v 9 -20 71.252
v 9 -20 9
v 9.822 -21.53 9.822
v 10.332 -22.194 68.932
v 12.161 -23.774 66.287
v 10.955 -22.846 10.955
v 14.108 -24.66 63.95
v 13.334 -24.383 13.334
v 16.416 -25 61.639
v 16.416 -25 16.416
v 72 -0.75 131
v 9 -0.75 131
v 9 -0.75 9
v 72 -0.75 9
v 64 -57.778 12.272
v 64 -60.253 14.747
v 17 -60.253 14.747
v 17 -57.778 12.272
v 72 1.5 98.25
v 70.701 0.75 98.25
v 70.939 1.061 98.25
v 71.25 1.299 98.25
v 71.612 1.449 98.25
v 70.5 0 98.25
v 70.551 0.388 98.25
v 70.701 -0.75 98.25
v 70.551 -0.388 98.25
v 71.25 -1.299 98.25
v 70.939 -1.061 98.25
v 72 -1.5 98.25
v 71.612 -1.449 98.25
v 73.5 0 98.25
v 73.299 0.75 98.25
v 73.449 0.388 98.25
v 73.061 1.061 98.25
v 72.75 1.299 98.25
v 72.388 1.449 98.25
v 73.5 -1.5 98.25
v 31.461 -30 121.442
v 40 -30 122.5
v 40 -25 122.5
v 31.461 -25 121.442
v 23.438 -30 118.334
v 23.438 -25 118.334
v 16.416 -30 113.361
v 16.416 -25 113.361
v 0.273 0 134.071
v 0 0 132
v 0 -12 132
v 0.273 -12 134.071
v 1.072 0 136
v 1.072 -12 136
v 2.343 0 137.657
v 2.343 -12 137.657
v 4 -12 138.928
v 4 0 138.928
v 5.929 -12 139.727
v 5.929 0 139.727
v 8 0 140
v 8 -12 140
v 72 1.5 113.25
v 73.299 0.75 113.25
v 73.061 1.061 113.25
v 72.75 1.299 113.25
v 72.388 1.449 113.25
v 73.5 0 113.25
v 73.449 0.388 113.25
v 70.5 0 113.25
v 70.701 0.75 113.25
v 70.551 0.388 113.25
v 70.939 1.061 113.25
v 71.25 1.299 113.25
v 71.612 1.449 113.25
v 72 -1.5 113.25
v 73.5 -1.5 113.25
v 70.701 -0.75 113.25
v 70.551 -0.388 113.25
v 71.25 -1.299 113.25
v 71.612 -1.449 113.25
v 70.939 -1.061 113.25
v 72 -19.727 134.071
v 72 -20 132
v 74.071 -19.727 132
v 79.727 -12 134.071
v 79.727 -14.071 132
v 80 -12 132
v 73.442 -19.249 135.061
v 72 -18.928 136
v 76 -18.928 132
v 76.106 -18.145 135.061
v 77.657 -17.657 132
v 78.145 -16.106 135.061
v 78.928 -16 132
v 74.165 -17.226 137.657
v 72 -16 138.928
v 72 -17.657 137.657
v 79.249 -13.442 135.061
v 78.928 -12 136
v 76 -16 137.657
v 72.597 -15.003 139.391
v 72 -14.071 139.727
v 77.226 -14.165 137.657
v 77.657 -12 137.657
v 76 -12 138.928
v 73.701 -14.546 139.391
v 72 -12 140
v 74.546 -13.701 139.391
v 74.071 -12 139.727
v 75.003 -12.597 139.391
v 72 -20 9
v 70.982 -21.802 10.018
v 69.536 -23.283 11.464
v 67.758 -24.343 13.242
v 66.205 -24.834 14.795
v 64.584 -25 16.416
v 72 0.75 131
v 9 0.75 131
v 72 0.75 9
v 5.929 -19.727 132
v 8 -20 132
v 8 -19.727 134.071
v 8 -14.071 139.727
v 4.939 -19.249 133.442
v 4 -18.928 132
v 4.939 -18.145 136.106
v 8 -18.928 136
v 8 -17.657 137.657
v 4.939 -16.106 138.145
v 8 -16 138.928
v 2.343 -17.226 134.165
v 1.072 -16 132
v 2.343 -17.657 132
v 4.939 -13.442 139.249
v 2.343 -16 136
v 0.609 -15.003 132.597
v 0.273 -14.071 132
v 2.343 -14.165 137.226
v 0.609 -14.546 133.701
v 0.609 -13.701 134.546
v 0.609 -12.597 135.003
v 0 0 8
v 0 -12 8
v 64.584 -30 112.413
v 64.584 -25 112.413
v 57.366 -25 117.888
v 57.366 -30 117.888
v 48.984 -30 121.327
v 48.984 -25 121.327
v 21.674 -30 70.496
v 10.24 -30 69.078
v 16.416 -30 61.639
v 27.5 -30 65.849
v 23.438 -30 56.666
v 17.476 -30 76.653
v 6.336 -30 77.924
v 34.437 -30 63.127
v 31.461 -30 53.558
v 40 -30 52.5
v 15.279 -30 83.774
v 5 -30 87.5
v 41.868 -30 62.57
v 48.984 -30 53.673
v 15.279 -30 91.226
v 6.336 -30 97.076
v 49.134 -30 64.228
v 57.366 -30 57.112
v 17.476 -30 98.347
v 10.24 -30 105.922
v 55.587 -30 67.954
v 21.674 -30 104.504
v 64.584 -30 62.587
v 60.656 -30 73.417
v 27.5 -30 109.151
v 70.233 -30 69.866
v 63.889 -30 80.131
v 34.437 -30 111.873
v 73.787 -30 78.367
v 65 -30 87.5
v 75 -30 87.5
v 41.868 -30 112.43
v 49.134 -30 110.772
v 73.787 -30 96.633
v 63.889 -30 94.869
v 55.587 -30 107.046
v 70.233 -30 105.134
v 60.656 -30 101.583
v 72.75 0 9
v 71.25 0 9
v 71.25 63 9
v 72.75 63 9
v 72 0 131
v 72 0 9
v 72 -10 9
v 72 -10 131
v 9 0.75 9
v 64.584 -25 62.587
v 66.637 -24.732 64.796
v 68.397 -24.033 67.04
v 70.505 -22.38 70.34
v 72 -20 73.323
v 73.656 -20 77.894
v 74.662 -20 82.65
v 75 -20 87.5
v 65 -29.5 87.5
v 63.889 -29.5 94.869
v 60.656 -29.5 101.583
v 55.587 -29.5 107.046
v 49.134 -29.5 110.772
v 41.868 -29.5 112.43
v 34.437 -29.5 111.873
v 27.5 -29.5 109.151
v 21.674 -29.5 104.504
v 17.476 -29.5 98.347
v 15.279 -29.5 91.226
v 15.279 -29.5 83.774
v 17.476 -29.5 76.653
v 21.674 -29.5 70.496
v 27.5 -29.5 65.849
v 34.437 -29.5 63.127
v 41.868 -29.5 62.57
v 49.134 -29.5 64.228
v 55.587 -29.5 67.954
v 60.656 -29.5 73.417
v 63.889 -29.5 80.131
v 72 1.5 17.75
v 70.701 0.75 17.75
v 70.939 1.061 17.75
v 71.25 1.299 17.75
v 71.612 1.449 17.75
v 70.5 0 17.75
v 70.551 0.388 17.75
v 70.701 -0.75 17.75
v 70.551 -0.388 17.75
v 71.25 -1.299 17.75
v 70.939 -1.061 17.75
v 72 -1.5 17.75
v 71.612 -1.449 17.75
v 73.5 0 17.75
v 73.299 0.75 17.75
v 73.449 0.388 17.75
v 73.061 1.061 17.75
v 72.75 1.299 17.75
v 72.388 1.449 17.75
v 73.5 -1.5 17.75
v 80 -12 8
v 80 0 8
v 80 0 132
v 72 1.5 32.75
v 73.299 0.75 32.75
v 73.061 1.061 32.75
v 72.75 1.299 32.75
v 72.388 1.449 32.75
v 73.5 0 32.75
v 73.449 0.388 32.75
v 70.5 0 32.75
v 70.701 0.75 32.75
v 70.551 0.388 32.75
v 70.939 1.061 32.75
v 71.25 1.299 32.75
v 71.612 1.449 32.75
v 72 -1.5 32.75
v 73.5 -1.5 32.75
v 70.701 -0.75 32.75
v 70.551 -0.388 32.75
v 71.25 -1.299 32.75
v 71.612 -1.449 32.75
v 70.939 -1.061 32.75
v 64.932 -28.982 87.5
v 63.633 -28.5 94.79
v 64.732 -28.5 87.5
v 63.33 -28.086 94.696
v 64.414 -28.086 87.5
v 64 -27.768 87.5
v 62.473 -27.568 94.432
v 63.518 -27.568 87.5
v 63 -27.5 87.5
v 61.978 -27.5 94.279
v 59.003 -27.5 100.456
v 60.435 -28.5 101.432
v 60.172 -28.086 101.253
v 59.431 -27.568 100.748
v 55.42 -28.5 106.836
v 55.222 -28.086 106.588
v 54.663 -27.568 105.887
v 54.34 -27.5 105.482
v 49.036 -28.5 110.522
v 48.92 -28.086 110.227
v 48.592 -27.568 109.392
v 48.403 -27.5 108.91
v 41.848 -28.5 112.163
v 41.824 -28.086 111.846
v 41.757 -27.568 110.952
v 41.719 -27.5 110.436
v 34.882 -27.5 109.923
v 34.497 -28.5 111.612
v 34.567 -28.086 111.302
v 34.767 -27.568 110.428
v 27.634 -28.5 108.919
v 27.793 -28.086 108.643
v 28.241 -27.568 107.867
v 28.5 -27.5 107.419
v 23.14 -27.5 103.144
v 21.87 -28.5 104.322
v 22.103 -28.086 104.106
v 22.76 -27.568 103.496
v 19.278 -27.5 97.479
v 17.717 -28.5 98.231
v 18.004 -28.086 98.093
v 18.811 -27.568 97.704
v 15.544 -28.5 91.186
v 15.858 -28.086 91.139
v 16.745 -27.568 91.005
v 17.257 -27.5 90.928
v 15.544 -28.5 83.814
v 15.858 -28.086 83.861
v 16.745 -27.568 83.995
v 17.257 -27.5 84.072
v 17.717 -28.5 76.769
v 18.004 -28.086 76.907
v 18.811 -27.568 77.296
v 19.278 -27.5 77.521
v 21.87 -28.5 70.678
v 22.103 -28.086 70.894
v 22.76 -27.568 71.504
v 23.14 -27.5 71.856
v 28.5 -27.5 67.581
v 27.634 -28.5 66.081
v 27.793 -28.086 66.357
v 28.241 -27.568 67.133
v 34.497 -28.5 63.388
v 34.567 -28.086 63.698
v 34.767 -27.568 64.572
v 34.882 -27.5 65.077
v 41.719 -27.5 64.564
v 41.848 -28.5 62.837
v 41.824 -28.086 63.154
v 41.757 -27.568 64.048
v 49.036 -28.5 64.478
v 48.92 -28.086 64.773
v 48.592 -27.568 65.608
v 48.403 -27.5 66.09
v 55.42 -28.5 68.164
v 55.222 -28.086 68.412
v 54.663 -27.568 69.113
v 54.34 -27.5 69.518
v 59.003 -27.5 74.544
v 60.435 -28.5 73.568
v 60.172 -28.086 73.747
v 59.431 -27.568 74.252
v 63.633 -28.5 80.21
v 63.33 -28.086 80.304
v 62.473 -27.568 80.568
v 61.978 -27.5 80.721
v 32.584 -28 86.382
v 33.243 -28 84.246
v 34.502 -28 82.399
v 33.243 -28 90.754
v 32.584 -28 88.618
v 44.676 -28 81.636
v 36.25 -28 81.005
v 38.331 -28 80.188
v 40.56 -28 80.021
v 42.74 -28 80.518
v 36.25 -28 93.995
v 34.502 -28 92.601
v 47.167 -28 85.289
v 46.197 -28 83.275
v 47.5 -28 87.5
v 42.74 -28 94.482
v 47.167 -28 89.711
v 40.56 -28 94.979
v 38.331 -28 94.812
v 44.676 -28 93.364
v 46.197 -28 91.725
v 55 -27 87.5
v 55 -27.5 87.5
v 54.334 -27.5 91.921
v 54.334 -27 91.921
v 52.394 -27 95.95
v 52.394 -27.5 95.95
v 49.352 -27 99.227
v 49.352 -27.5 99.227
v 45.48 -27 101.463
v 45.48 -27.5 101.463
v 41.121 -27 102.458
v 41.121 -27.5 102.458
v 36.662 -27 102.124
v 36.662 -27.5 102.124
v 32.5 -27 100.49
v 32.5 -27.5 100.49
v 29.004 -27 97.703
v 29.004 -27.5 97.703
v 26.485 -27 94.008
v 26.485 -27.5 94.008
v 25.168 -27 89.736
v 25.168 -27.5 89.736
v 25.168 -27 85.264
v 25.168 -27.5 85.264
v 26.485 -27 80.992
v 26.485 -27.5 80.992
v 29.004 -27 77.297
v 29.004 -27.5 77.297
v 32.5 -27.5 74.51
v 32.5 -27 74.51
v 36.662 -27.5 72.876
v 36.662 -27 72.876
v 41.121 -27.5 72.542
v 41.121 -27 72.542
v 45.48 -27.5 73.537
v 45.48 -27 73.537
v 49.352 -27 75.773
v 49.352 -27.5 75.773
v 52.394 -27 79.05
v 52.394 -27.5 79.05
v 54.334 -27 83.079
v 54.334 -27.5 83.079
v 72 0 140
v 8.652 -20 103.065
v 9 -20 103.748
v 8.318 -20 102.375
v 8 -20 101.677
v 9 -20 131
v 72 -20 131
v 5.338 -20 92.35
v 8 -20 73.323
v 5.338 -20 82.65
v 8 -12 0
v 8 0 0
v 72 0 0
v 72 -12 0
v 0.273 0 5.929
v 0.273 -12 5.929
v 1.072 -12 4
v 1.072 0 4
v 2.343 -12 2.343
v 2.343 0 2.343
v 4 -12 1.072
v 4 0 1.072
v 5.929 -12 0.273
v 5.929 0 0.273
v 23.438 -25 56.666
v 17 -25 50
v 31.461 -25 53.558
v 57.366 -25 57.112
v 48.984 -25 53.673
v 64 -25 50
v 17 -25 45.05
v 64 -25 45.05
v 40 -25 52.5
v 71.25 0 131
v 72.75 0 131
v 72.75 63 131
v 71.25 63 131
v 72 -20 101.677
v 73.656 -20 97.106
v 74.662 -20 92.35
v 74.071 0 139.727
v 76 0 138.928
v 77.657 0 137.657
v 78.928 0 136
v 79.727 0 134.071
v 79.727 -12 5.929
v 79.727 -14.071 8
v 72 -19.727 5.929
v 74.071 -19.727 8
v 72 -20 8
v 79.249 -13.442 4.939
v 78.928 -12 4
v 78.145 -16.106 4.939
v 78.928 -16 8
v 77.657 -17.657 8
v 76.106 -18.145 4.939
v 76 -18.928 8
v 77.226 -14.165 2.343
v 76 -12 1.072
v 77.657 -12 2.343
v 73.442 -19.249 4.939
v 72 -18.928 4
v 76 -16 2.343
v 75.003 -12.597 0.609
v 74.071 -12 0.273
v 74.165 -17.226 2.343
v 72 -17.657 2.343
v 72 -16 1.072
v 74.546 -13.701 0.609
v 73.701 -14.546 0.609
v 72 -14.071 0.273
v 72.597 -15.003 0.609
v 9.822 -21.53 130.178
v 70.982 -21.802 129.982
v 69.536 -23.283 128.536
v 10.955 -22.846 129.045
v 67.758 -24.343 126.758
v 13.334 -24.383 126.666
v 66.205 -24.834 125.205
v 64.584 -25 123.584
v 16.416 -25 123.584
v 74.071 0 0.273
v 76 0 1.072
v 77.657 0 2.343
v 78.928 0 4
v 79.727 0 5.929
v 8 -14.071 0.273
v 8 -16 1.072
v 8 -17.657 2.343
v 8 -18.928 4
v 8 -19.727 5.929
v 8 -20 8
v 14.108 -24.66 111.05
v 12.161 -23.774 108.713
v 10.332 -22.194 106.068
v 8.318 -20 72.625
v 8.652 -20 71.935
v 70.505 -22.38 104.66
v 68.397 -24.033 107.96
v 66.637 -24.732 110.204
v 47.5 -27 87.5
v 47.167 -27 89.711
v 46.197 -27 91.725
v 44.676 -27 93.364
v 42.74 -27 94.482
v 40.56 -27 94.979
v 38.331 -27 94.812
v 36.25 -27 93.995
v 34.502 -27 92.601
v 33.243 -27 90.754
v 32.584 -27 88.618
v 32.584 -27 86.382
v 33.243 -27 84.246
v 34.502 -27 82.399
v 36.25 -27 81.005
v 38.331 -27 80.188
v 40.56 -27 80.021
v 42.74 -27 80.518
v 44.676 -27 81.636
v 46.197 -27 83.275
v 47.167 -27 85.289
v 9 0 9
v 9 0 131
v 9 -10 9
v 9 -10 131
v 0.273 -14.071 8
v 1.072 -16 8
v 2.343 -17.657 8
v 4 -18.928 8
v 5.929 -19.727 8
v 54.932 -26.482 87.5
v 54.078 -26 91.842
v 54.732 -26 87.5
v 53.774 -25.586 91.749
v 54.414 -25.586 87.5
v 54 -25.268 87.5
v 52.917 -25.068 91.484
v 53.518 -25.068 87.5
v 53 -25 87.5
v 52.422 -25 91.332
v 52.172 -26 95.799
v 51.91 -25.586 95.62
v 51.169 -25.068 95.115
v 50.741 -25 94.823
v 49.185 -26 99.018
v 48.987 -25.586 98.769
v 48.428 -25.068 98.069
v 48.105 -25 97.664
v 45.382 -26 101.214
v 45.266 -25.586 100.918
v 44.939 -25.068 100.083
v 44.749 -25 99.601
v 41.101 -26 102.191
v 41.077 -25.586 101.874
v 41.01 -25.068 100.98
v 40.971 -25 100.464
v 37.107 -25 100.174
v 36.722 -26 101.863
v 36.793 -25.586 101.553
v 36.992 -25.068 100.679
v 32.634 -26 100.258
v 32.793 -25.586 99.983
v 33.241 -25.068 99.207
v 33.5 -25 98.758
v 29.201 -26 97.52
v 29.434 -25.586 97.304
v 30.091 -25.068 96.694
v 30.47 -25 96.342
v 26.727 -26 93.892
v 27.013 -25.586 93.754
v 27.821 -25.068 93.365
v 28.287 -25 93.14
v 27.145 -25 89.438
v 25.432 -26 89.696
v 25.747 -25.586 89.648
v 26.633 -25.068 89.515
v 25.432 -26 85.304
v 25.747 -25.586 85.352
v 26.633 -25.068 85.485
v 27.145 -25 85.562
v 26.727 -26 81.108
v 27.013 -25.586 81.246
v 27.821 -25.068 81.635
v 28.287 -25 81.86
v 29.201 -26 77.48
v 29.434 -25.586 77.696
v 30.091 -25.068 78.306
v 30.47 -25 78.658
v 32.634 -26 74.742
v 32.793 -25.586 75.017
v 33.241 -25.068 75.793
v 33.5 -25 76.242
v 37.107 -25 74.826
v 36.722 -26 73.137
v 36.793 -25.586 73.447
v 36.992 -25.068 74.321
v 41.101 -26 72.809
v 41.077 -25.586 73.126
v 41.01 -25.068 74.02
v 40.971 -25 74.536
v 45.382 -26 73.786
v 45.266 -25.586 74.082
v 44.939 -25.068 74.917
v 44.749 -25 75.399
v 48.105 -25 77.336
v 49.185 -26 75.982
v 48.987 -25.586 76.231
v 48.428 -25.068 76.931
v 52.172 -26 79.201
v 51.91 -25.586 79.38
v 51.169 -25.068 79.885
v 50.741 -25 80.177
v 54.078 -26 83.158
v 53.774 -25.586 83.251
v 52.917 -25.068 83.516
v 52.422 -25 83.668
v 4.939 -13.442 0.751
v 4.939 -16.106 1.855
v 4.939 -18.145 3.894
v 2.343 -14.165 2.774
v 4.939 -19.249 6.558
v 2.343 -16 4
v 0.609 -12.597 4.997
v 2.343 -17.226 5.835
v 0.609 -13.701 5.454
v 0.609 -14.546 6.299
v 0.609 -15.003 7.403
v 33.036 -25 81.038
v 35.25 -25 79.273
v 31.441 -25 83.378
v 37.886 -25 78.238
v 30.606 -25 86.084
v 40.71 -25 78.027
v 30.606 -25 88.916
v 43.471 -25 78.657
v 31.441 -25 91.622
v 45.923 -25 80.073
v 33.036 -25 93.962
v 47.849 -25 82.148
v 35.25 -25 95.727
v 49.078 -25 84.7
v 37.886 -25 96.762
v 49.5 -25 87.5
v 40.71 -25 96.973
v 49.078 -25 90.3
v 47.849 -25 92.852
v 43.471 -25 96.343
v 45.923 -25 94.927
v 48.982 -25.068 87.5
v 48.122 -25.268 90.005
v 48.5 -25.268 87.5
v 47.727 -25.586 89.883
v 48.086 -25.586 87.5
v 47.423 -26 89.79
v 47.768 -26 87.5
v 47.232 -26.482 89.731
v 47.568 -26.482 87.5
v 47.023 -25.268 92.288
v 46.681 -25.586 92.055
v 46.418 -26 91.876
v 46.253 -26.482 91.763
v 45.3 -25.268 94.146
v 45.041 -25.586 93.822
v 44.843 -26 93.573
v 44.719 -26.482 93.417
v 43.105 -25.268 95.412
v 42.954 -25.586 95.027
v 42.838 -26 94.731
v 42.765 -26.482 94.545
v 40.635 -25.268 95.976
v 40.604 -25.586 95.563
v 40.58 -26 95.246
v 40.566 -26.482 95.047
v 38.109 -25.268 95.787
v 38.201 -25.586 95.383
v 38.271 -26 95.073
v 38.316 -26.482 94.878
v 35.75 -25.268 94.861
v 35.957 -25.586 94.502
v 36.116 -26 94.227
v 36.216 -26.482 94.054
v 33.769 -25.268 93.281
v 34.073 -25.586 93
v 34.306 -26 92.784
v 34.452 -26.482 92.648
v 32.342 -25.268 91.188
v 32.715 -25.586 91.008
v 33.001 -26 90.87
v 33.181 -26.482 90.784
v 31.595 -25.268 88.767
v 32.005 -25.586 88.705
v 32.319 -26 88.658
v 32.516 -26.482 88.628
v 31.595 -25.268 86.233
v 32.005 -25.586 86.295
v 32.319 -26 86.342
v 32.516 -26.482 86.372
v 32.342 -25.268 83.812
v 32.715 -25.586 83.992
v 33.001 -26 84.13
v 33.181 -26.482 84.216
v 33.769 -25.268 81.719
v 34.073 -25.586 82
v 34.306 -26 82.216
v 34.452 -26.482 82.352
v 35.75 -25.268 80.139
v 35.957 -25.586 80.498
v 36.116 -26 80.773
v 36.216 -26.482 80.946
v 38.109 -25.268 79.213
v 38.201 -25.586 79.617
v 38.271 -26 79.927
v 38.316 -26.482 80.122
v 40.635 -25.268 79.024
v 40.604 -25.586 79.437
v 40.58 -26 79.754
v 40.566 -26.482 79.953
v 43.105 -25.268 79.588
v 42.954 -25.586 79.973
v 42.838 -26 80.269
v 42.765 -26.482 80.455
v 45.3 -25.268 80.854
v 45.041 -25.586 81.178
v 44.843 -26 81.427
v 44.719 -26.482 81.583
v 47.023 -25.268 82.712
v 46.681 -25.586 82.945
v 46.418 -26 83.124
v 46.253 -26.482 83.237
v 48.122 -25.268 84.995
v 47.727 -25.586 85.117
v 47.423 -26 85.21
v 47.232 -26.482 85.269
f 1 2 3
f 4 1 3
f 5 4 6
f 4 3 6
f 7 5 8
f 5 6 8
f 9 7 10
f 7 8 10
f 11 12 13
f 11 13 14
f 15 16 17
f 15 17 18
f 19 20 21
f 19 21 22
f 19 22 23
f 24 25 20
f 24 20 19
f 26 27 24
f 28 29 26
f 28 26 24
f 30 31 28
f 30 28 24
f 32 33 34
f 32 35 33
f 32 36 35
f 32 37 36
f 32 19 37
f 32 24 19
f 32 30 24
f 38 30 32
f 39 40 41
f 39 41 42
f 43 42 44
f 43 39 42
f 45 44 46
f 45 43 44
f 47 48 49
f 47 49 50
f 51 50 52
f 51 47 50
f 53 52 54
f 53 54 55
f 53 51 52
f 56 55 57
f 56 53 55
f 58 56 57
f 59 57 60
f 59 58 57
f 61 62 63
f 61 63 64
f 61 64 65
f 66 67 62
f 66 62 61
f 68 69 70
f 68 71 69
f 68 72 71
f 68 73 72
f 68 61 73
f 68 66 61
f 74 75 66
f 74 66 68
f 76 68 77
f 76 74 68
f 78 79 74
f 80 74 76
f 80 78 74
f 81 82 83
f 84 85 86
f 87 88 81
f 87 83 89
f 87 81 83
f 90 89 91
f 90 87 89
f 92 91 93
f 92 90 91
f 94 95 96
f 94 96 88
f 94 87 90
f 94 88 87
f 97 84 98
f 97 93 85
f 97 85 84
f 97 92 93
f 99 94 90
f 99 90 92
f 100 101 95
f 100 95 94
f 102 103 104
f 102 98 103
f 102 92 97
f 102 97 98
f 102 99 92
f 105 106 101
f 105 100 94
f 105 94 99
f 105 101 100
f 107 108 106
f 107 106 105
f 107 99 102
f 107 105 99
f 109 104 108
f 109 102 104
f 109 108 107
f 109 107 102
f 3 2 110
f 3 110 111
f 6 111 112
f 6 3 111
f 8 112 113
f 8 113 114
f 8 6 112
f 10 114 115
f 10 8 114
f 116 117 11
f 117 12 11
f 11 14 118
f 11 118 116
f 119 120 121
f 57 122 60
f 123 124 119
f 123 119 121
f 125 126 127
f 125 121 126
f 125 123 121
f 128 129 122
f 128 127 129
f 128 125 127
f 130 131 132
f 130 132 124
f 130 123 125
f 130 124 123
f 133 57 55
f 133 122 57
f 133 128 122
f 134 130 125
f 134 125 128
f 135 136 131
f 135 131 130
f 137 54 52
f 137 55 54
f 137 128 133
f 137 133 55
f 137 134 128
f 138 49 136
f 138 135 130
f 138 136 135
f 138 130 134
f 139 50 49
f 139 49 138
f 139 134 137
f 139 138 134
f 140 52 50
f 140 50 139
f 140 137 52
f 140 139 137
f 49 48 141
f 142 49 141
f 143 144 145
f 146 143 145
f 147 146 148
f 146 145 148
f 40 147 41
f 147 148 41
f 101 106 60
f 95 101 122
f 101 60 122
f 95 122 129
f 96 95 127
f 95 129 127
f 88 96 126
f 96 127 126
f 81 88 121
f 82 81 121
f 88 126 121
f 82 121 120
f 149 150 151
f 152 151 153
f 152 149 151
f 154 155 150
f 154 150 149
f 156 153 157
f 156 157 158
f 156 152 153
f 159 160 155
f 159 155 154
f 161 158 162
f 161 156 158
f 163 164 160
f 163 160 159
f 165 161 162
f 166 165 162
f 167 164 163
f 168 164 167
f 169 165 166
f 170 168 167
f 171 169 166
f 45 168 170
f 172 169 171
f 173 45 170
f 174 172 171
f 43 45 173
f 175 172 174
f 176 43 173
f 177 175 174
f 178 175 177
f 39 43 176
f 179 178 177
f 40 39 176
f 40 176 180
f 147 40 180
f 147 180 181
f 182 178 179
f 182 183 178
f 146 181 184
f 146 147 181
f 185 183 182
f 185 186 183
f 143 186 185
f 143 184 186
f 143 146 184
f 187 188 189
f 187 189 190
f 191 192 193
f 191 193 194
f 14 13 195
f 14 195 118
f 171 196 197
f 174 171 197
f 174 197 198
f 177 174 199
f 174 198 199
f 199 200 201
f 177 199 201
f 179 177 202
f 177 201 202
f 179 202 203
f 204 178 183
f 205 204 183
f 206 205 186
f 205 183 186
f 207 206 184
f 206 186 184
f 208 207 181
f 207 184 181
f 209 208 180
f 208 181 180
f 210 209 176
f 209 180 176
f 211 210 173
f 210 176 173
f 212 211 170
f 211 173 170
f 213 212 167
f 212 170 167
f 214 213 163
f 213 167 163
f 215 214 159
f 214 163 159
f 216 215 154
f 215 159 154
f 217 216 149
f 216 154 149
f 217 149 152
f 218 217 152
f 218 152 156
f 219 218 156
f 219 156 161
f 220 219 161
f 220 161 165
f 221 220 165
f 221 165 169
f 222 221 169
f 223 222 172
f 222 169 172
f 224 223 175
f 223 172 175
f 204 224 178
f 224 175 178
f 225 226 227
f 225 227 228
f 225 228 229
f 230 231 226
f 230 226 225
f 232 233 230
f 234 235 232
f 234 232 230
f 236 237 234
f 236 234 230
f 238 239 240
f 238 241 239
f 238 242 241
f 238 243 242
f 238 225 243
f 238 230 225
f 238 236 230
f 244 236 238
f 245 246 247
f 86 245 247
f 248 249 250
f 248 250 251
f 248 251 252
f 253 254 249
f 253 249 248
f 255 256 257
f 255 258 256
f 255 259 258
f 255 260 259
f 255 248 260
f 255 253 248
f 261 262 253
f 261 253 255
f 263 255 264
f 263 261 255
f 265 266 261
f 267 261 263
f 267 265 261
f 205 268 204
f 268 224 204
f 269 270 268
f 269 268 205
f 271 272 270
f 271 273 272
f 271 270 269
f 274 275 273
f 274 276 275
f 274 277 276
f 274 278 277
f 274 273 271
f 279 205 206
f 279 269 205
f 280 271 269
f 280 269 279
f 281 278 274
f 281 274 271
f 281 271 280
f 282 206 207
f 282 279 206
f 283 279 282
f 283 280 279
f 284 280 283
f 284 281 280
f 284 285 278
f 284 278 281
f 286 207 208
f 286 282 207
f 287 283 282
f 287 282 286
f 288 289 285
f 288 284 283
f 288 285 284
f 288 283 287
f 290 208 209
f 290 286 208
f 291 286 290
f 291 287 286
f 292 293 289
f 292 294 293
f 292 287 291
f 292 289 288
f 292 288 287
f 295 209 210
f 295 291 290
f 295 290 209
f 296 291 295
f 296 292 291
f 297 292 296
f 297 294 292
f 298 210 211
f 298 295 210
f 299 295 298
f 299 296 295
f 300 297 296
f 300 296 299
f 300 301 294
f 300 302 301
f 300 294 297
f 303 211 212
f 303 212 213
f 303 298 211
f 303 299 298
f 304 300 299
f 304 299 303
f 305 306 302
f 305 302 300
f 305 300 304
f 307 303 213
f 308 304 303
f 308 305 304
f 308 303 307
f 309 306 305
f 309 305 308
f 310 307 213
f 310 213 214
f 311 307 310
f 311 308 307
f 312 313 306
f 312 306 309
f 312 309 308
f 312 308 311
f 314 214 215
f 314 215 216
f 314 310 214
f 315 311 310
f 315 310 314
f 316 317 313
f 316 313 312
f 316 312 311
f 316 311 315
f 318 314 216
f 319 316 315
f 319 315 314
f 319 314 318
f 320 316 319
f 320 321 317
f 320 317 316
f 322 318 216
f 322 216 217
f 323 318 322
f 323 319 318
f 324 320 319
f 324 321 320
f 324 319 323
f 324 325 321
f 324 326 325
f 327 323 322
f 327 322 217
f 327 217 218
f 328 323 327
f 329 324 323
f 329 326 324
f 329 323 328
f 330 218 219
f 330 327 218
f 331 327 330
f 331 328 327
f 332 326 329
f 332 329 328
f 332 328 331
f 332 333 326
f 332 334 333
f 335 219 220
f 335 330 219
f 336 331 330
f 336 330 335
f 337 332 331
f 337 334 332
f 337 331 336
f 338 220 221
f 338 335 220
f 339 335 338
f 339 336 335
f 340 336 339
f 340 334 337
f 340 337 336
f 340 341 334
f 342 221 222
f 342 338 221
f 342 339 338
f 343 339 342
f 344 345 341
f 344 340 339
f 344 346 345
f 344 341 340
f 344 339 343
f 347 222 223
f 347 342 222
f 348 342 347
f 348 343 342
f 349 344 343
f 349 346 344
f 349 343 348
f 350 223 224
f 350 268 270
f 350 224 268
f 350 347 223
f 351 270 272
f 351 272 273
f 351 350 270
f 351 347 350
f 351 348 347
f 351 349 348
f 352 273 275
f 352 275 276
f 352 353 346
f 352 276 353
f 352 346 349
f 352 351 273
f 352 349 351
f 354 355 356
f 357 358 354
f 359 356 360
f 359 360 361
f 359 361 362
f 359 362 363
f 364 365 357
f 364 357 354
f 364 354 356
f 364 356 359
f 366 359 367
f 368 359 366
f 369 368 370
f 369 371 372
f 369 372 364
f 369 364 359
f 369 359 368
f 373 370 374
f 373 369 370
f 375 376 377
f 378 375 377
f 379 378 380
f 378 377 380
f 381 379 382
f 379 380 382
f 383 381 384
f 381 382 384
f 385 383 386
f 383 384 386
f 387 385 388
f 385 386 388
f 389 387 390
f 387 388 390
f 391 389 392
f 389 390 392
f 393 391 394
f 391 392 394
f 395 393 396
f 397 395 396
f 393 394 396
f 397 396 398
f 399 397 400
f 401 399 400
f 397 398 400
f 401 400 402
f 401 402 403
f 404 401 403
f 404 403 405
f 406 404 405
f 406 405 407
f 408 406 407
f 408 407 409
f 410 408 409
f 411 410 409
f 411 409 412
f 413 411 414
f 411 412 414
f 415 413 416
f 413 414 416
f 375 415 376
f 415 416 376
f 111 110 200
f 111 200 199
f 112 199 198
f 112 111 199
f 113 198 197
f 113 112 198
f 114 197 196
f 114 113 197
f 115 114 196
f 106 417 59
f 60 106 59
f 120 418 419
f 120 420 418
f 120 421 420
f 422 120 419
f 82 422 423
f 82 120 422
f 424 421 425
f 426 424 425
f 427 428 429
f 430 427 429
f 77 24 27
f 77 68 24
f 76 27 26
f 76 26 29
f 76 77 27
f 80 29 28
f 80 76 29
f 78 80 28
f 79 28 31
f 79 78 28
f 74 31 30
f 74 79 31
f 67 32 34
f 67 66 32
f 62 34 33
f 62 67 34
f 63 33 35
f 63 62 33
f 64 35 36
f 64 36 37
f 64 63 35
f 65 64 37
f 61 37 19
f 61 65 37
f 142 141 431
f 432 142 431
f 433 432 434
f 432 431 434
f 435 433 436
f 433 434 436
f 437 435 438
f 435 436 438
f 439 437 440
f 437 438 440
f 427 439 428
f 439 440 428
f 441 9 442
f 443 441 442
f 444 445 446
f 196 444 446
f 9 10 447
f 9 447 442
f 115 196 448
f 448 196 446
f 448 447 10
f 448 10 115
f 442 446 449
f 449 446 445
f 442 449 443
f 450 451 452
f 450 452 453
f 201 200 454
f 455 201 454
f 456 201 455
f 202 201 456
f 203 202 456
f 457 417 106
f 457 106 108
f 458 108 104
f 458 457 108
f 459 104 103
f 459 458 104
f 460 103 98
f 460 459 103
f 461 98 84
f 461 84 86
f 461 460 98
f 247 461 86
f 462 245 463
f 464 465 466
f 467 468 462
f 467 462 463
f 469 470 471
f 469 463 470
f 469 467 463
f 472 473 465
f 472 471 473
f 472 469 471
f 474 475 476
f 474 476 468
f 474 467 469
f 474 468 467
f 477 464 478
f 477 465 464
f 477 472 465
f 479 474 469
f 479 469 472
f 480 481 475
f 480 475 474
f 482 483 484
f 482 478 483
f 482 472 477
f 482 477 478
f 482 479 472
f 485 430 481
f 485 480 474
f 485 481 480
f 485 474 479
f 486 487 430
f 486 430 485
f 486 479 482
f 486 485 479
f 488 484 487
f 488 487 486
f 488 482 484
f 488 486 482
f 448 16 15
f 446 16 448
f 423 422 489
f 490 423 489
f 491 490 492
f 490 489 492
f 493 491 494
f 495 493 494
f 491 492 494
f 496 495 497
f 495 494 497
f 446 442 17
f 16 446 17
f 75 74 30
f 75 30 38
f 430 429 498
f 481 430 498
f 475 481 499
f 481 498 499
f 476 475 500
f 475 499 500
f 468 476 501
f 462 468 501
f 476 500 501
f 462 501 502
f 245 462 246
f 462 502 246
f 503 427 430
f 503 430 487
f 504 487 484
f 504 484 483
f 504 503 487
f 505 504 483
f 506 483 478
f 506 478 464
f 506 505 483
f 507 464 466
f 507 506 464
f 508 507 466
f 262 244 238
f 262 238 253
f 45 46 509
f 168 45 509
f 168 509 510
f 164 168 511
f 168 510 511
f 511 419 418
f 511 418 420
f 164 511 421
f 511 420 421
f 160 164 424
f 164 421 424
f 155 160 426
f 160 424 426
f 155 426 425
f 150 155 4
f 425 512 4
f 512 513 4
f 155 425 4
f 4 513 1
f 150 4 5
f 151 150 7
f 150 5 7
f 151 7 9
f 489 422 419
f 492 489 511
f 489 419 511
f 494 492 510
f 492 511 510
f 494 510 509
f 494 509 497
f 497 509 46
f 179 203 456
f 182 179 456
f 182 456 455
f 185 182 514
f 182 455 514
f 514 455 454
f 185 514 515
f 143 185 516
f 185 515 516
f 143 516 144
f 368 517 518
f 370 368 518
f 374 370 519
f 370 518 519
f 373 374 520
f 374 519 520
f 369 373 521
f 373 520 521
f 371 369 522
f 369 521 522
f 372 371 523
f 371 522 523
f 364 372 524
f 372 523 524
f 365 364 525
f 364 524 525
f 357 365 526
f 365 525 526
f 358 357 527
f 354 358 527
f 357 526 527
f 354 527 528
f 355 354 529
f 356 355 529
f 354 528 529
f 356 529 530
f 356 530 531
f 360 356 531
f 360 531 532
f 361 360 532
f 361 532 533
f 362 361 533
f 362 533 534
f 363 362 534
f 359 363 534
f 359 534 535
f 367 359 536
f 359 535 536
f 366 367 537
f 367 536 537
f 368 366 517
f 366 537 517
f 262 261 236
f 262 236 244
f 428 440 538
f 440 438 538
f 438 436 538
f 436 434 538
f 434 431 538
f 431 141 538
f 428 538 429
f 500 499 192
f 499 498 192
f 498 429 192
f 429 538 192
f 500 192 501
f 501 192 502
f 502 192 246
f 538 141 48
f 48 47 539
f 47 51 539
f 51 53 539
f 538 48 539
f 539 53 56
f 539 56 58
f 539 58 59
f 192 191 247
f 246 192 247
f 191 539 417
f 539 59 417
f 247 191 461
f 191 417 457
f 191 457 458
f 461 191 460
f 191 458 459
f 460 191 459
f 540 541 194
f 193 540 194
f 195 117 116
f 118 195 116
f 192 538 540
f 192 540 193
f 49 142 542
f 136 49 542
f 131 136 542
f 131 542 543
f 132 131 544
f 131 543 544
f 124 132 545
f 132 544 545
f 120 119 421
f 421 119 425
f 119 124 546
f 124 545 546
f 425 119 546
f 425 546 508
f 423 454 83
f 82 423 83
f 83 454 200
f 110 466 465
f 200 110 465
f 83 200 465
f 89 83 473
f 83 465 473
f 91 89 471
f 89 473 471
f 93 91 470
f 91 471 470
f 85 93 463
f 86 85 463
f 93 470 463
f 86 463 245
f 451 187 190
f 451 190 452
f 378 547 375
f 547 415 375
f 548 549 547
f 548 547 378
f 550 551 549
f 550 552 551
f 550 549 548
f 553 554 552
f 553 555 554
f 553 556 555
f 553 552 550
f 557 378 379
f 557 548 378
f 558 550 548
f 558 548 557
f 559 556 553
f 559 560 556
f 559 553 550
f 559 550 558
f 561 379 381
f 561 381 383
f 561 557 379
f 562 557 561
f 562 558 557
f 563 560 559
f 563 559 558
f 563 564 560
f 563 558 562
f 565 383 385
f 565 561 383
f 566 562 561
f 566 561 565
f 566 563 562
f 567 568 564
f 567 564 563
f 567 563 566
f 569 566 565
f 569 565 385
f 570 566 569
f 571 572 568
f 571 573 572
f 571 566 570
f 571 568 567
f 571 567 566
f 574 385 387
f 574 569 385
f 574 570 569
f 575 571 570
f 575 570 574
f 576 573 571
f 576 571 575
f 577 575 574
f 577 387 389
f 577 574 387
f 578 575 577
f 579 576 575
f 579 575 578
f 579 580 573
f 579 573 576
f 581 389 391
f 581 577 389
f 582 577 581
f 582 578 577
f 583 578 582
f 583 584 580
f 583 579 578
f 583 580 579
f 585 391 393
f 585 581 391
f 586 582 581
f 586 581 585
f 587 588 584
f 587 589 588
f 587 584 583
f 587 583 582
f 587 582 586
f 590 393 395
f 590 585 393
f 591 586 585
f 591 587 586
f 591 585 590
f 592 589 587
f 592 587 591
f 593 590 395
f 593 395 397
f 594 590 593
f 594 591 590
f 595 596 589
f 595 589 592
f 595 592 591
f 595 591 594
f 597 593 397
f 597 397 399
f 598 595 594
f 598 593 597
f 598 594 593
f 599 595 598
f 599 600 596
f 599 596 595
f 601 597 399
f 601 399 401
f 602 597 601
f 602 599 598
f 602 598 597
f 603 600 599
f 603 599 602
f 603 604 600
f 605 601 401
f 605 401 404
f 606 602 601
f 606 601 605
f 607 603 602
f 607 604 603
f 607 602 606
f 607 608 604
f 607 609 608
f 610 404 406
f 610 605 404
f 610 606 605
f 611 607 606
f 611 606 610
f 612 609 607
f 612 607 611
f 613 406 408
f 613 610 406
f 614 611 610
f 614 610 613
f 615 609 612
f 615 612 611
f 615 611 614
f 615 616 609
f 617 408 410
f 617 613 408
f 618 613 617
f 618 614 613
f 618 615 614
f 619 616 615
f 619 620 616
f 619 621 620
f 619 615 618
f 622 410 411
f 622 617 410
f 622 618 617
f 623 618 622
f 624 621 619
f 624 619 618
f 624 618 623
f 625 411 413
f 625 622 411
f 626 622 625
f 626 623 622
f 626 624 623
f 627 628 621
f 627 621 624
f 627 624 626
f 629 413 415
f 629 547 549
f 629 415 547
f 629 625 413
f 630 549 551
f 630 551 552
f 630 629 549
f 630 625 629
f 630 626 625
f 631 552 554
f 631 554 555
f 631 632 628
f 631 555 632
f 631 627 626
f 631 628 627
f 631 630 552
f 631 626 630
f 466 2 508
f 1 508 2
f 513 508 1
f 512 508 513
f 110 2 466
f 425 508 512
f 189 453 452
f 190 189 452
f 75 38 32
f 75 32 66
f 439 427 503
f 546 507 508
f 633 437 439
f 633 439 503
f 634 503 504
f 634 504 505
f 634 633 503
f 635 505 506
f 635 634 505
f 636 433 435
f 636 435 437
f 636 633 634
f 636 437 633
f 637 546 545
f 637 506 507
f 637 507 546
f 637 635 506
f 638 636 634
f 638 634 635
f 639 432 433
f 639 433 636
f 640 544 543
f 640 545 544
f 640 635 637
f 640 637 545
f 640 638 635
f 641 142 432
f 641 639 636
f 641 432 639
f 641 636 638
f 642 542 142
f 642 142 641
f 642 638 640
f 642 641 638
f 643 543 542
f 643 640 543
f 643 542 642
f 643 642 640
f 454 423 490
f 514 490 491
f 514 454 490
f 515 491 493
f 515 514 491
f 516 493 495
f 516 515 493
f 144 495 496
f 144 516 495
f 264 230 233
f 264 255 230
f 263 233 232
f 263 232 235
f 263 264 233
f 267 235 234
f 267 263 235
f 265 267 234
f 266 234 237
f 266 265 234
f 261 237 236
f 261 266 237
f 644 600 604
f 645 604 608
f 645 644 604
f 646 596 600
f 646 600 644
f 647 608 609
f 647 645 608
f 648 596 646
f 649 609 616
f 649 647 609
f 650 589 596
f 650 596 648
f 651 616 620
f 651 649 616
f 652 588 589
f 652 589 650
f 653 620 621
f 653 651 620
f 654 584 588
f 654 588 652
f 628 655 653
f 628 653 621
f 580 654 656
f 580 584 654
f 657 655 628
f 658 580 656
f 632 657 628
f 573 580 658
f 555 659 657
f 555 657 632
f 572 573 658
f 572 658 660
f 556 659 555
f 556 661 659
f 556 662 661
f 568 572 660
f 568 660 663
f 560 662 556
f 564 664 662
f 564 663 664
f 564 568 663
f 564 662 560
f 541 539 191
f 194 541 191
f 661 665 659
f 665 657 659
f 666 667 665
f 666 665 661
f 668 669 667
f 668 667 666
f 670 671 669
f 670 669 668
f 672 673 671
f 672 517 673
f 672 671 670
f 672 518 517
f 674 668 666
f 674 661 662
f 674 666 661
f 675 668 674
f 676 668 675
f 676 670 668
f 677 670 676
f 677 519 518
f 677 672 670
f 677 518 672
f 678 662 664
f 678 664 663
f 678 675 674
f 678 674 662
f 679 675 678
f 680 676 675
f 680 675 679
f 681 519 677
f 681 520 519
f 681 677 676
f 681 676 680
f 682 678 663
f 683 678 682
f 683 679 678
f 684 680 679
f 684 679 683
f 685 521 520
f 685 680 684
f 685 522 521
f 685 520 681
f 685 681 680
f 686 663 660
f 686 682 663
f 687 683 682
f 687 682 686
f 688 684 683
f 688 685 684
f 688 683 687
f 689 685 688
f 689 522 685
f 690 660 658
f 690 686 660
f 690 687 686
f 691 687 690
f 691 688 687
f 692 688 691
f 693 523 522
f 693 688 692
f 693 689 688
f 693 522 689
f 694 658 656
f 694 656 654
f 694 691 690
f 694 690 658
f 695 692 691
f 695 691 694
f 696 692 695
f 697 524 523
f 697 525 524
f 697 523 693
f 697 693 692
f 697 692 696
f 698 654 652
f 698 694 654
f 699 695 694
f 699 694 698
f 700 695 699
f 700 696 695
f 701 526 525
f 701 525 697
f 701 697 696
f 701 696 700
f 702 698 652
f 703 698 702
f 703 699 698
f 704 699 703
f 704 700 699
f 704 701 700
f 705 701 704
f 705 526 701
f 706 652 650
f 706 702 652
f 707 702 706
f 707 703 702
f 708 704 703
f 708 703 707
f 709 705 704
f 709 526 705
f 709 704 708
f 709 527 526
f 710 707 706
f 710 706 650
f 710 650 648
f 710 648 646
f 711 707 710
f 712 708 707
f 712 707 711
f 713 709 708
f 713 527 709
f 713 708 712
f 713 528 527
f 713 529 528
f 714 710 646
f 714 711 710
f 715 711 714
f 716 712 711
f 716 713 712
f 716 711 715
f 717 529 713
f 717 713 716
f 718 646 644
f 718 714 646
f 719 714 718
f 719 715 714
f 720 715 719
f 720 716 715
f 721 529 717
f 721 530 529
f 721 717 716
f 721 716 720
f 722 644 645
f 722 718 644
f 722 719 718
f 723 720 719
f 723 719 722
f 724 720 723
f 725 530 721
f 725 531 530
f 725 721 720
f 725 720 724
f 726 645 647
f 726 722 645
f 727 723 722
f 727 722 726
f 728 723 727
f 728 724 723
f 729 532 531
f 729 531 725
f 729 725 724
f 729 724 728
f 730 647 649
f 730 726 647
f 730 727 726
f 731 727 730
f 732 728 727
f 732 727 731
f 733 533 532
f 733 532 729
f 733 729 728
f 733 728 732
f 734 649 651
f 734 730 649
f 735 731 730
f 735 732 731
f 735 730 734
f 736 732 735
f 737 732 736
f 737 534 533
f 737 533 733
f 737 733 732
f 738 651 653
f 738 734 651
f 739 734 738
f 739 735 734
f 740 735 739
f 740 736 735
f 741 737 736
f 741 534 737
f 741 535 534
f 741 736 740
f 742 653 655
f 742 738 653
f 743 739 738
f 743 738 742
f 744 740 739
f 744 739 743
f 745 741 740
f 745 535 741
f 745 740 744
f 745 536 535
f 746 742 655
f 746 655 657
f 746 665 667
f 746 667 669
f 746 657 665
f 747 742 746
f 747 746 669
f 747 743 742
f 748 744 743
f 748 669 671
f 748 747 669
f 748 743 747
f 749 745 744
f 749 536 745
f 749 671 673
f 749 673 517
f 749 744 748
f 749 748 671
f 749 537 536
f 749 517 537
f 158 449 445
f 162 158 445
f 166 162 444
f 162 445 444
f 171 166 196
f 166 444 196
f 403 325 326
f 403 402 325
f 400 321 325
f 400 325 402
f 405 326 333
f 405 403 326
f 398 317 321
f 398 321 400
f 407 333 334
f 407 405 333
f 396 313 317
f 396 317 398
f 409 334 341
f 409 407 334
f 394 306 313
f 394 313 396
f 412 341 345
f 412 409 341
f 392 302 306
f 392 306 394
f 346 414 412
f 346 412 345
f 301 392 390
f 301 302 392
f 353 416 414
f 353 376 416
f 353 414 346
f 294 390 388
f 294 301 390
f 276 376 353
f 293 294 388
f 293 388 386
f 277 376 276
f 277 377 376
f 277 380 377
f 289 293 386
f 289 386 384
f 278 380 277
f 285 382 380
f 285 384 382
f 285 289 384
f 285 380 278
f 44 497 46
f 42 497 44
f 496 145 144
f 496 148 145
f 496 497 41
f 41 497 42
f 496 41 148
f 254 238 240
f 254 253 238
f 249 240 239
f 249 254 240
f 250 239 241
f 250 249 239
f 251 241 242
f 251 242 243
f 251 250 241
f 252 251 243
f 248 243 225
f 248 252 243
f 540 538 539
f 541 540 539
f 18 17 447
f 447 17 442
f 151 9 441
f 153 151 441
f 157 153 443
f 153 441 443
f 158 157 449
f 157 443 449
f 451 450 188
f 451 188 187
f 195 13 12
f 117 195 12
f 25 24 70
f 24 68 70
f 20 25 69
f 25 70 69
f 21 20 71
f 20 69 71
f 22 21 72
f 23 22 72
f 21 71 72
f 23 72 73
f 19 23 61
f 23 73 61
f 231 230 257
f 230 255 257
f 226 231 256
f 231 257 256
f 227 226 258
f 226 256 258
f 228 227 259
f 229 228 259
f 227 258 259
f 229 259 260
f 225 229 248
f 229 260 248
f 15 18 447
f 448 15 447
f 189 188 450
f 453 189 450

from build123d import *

# Parameters (mm, degrees)
F0_W         = 63
F0_H         = 122
F1_DEPTH     = 20
F2_DEPTH     = 25
F3_DEPTH     = 10
F4_T1_DEPTH  = 32
F4_T3_DEPTH  = 64
F4_T5_DEPTH  = 124
F4_T7_DEPTH  = 159.0809924355
F4_T9_DEPTH  = 100.0809924355
F4_S13_W     = 8.16
F4_S13_H     = 8.16
F4_T14_DEPTH = 8.16
F4_S19_W     = 8.16
F4_S19_H     = 8.16
F4_T20_DEPTH = 8.16
F4_S25_W     = 8.16
F4_S25_H     = 8.16
F4_T26_DEPTH = 8.16
F4_S31_W     = 8.16
F4_S31_H     = 8.16
F4_T32_DEPTH = 8.16
F5_W         = 1.5
F5_H         = 15
F6_DEPTH     = 1.5
F7_R         = 1.49999
F7_2_R       = 1.49999
F8_W         = 0.75
F8_H         = 122
F9_DEPTH     = 63
F10_W        = 63
F10_H        = 122
F11_DEPTH    = 0.75
F13_DEPTH    = 64
F14_DEPTH    = 17
F16_DEPTH    = 5
F17_R        = 25
F18_DEPTH    = 2.5
F19_R        = 15
F20_DEPTH    = 2.5
F21_R        = 7.5
F22_DEPTH    = 3
F23_R        = 2


# Not quite as in the source:
# - a fillet or chamfer that OpenCascade refuses, or shapes differently, is made with other operations: its cross-section is extruded or revolved along the edge and cut away or added
# - a fillet or chamfer is up to 0.001 mm smaller than in the source, because OpenCascade refuses the exact size


with BuildPart() as f1:
    # F0 (on Front) → F1 (new body)
    with BuildSketch(Plane.XZ):
        Polygon((0, 140), (0, 0), (9, 0), (80, 0), (80, 140), align=None)
        with Locations((40.5, 70)):
            Rectangle(F0_W, F0_H, mode=Mode.SUBTRACT)
    extrude(amount=F1_DEPTH)

    # F0 (on Front) → F2 (join)
    with BuildSketch(Plane.XZ):
        with Locations((40.5, 70)):
            Rectangle(F0_W, F0_H)
    extrude(amount=F2_DEPTH)

    # F0 (on Front) → F3 (cut)
    with BuildSketch(Plane.XZ):
        with Locations((40.5, 70)):
            Rectangle(F0_W, F0_H)
    extrude(amount=F3_DEPTH, mode=Mode.SUBTRACT)

    # F4: fillet of radius 8 on 12 edges, made by hand

    # F4_s2 → F4_t1 (cut)
    with BuildSketch(Plane.XZ.offset(-20)):
        with BuildLine():
            ThreePointArc((0, 8), (2.3431457505, 2.3431457505), (8, 0))
            Line((8, 0), (8, -0.16))
            Line((8, -0.16), (-0.16, -0.16))
            Line((-0.16, -0.16), (-0.16, 8))
            Line((-0.16, 8), (0, 8))
        make_face()
        with BuildLine():
            ThreePointArc((72, 0), (77.6568542495, 2.3431457505), (80, 8))
            Line((80, 8), (80.16, 8))
            Line((80.16, 8), (80.16, -0.16))
            Line((80.16, -0.16), (72, -0.16))
            Line((72, -0.16), (72, 0))
        make_face()
        with BuildLine():
            ThreePointArc((0, 132), (2.3431457505, 137.6568542495), (8, 140))
            Line((8, 140), (8, 140.16))
            Line((8, 140.16), (-0.16, 140.16))
            Line((-0.16, 140.16), (-0.16, 132))
            Line((-0.16, 132), (0, 132))
        make_face()
        with BuildLine():
            ThreePointArc((72, 140), (77.6568542495, 137.6568542495), (80, 132))
            Line((80, 132), (80.16, 132))
            Line((80.16, 132), (80.16, 140.16))
            Line((80.16, 140.16), (72, 140.16))
            Line((72, 140.16), (72, 140))
        make_face()
    extrude(amount=F4_T1_DEPTH, mode=Mode.SUBTRACT)

    # F4_s4 → F4_t3 (cut)
    with BuildSketch(Plane.YZ.offset(8)):
        with BuildLine():
            ThreePointArc((-12, 140), (-17.6568542495, 137.6568542495), (-20, 132))
            Line((-20, 132), (-20.16, 132))
            Line((-20.16, 132), (-20.16, 140.16))
            Line((-20.16, 140.16), (-12, 140.16))
            Line((-12, 140.16), (-12, 140))
        make_face()
        with BuildLine():
            ThreePointArc((-12, 0), (-17.6568542495, 2.3431457505), (-20, 8))
            Line((-20, 8), (-20.16, 8))
            Line((-20.16, 8), (-20.16, -0.16))
            Line((-20.16, -0.16), (-12, -0.16))
            Line((-12, -0.16), (-12, 0))
        make_face()
    extrude(amount=F4_T3_DEPTH, mode=Mode.SUBTRACT)

    # F4_s6 → F4_t5 (cut)
    with BuildSketch(Plane.XY.offset(8)):
        with BuildLine():
            ThreePointArc((0, -12), (2.3431457505, -17.6568542495), (8, -20))
            Line((8, -20), (8, -20.16))
            Line((8, -20.16), (-0.16, -20.16))
            Line((-0.16, -20.16), (-0.16, -12))
            Line((-0.16, -12), (0, -12))
        make_face()
        with BuildLine():
            ThreePointArc((72, -20), (77.6568542495, -17.6568542495), (80, -12))
            Line((80, -12), (80.16, -12))
            Line((80.16, -12), (80.16, -20.16))
            Line((80.16, -20.16), (72, -20.16))
            Line((72, -20.16), (72, -20))
        make_face()
    extrude(amount=F4_T5_DEPTH, mode=Mode.SUBTRACT)

    # F4_s8 → F4_t7 (cut)
    with BuildSketch(Plane.XY.offset(-9.5404962177)):
        with BuildLine():
            ThreePointArc((72, -20), (69.0559374679, -23.6332495807), (64.5838015129, -25))
            Line((64.5838015129, -25), (64.5838015129, -25.16))
            Line((64.5838015129, -25.16), (72, -25.16))
            Line((72, -25.16), (72.16, -25))
            ThreePointArc((72.16, -25), (72.16, -22.5), (72.1483239697, -20.06))
            Line((72.1483239697, -20.06), (72, -20))
        make_face()
        with BuildLine():
            ThreePointArc((9, -20), (11.9440625321, -23.6332495807), (16.4161984871, -25))
            Line((16.4161984871, -25), (16.4161984871, -25.16))
            Line((16.4161984871, -25.16), (9, -25.16))
            Line((9, -25.16), (8.84, -25))
            ThreePointArc((8.84, -25), (8.84, -22.5), (8.8516760303, -20.06))
            Line((8.8516760303, -20.06), (9, -20))
        make_face()
    extrude(amount=F4_T7_DEPTH, mode=Mode.SUBTRACT)

    # F4_s10 → F4_t9 (cut)
    with BuildSketch(Plane.YZ.offset(-9.5404962177)):
        with BuildLine():
            ThreePointArc((-20, 131), (-23.6332495807, 128.0559374679), (-25, 123.5838015129))
            Line((-25, 123.5838015129), (-25.16, 123.5838015129))
            Line((-25.16, 123.5838015129), (-25.16, 131))
            Line((-25.16, 131), (-25, 131.16))
            ThreePointArc((-25, 131.16), (-22.5, 131.16), (-20.06, 131.1483239697))
            Line((-20.06, 131.1483239697), (-20, 131))
        make_face()
        with BuildLine():
            ThreePointArc((-20, 9), (-23.6332495807, 11.9440625321), (-25, 16.4161984871))
            Line((-25, 16.4161984871), (-25.16, 16.4161984871))
            Line((-25.16, 16.4161984871), (-25.16, 9))
            Line((-25.16, 9), (-25, 8.84))
            ThreePointArc((-25, 8.84), (-22.5, 8.84), (-20.06, 8.8516760303))
            Line((-20.06, 8.8516760303), (-20, 9))
        make_face()
    extrude(amount=F4_T9_DEPTH, mode=Mode.SUBTRACT)


with BuildPart() as f4_tool12:
    # F4_s13 → F4_t14 (new body)
    with BuildSketch(Plane.YZ.offset(8)):
        with Locations((-16.08, 3.92)):
            Rectangle(F4_S13_W, F4_S13_H)
    extrude(amount=-F4_T14_DEPTH)

    # F4_s15 → F4_t16 (revolve, cut)
    with BuildSketch(Plane(origin=(8, -12, 8), x_dir=(0, 0.7071067812, 0.7071067812), z_dir=(0, -0.7071067812, 0.7071067812))):
        with BuildLine():
            ThreePointArc((0, -8), (8, 0), (0, 8))
            Line((0, 8), (0, -8))
        make_face()
    revolve(axis=Axis((8, -12, 8), (-1, 0, 0)), mode=Mode.SUBTRACT)


with BuildPart() as f1_1:
    add(f1.part)

    # F4_t11: cut F4_tool12
    add(f4_tool12.part, mode=Mode.SUBTRACT)


with BuildPart() as f4_tool18:
    # F4_s19 → F4_t20 (new body)
    with BuildSketch(Plane.XY.offset(8)):
        with Locations((76.08, -16.08)):
            Rectangle(F4_S19_W, F4_S19_H)
    extrude(amount=-F4_T20_DEPTH)

    # F4_s21 → F4_t22 (revolve, cut)
    with BuildSketch(Plane(origin=(72, -12, 8), x_dir=(-0.7071067812, 0.7071067812, 0), z_dir=(-0.7071067812, -0.7071067812, 0))):
        with BuildLine():
            ThreePointArc((0, -8), (8, 0), (0, 8))
            Line((0, 8), (0, -8))
        make_face()
    revolve(axis=Axis((72, -12, 8), (0, 0, -1)), mode=Mode.SUBTRACT)


with BuildPart() as f1_2:
    add(f1_1.part)

    # F4_t17: cut F4_tool18
    add(f4_tool18.part, mode=Mode.SUBTRACT)


with BuildPart() as f4_tool24:
    # F4_s25 → F4_t26 (new body)
    with BuildSketch(Plane.YZ.offset(8)):
        with Locations((-16.08, 136.08)):
            Rectangle(F4_S25_W, F4_S25_H)
    extrude(amount=-F4_T26_DEPTH)

    # F4_s27 → F4_t28 (revolve, cut)
    with BuildSketch(Plane(origin=(8, -12, 132), x_dir=(0, 0.7071067812, -0.7071067812), z_dir=(0, 0.7071067812, 0.7071067812))):
        with BuildLine():
            ThreePointArc((0, -8), (8, 0), (0, 8))
            Line((0, 8), (0, -8))
        make_face()
    revolve(axis=Axis((8, -12, 132), (-1, 0, 0)), mode=Mode.SUBTRACT)


with BuildPart() as f1_3:
    add(f1_2.part)

    # F4_t23: cut F4_tool24
    add(f4_tool24.part, mode=Mode.SUBTRACT)


with BuildPart() as f4_tool30:
    # F4_s31 → F4_t32 (new body)
    with BuildSketch(Plane.XY.offset(132)):
        with Locations((76.08, -16.08)):
            Rectangle(F4_S31_W, F4_S31_H)
    extrude(amount=F4_T32_DEPTH)

    # F4_s33 → F4_t34 (revolve, cut)
    with BuildSketch(Plane(origin=(72, -12, 132), x_dir=(-0.7071067812, 0.7071067812, 0), z_dir=(0.7071067812, 0.7071067812, 0))):
        with BuildLine():
            ThreePointArc((0, -8), (8, 0), (0, 8))
            Line((0, 8), (0, -8))
        make_face()
    revolve(axis=Axis((72, -12, 132), (0, 0, 1)), mode=Mode.SUBTRACT)


with BuildPart() as f1_4:
    add(f1_3.part)

    # F4_t29: cut F4_tool30
    add(f4_tool30.part, mode=Mode.SUBTRACT)

    # F12 (on Right) → F13 (join)
    with BuildSketch(Plane.YZ):
        Polygon((-57.7781745931, 12.2720779386), (-25, 45.0502525317), (-25, 50), (-50, 25), (-60.2530483272, 14.7469516728), align=None)
    extrude(amount=F13_DEPTH)

    # F14 (cut): a face of the model
    f14_faces = [f1_4.faces().sort_by_distance(p)[0] for p in [
        (0, -42.0153084126, 30.5398285833),
    ]]
    extrude(f14_faces, amount=-F14_DEPTH, mode=Mode.SUBTRACT)

    # F15 (on face) → F16 (join, symmetric)
    with BuildSketch(Plane.XZ.offset(25)):
        with BuildLine():
            Line((40, 52.5), (40, 70))
            Line((40, 70), (40, 87.5))
            Line((40, 87.5), (40, 105))
            Line((40, 105), (40, 122.5))
            ThreePointArc((40, 122.5), (27.3537315182, 120.1354392262), (16.4161984871, 113.3612510564))
            Line((16.4161984871, 113.3612510564), (16.4161984871, 61.6387489436))
            ThreePointArc((16.4161984871, 61.6387489436), (27.3537315182, 54.8645607738), (40, 52.5))
        make_face()
        with BuildLine():
            Line((40, 87.5), (40, 70))
            Line((40, 70), (40, 52.5))
            ThreePointArc((40, 52.5), (53.2864528225, 55.1199108804), (64.5838015129, 62.5874187774))
            Line((64.5838015129, 62.5874187774), (64.5838015129, 112.4125812226))
            ThreePointArc((64.5838015129, 112.4125812226), (53.2864528225, 119.8800891196), (40, 122.5))
            Line((40, 122.5), (40, 105))
            Line((40, 105), (40, 87.5))
        make_face()
        with BuildLine():
            ThreePointArc((16.4161984871, 113.3612510564), (5, 87.5), (16.4161984871, 61.6387489436))
            Line((16.4161984871, 61.6387489436), (16.4161984871, 113.3612510564))
        make_face()
        with BuildLine():
            Line((64.5838015129, 112.4125812226), (64.5838015129, 62.5874187774))
            ThreePointArc((64.5838015129, 62.5874187774), (72.2911214806, 73.9987602968), (75, 87.5))
            ThreePointArc((75, 87.5), (72.2911214806, 101.0012397032), (64.5838015129, 112.4125812226))
        make_face()
    extrude(amount=F16_DEPTH, both=True)

    # F17 (on face) → F18 (cut)
    with BuildSketch(Plane.XZ.offset(30)):
        with Locations((40, 87.5)):
            Circle(F17_R)
    extrude(amount=-F18_DEPTH, mode=Mode.SUBTRACT)

    # F19 (on face) → F20 (cut)
    with BuildSketch(Plane.XZ.offset(27.5)):
        with Locations((40, 87.5)):
            Circle(F19_R)
    extrude(amount=-F20_DEPTH, mode=Mode.SUBTRACT)

    # F21 (on face) → F22 (join)
    with BuildSketch(Plane.XZ.offset(25)):
        with Locations((40, 87.5)):
            Circle(F21_R)
    extrude(amount=F22_DEPTH)

    # F23
    f23_edges = [f1_4.edges().sort_by_distance(p)[0] for p in [
        (15, -27.5, 87.5),
        (25, -25, 87.5),
        (32.5, -25, 87.5),
    ]]
    fillet(f23_edges, radius=F23_R)


with BuildPart() as f6:
    # F5 (on face) → F6 (new body, symmetric)
    with BuildSketch(Plane.XZ):
        with Locations((72.75, 105.75)):
            Rectangle(F5_W, F5_H)
        with Locations((71.25, 105.75)):
            Rectangle(F5_W, F5_H)
    extrude(amount=F6_DEPTH, both=True)

    # F7 (radius 1.5 in the source; OpenCascade refuses exactly that, so slightly less here)
    f7_edges = [f6.edges().sort_by_distance(p)[0] for p in [
        (73.5, 1.5, 105.75),
        (70.5, 1.5, 105.75),
        (70.5, -1.5, 105.75),
    ]]
    fillet(f7_edges, radius=F7_R)


with BuildPart() as f6b:
    # F5 (on face) → F6, piece 2 (new body, symmetric)
    with BuildSketch(Plane.XZ):
        with Locations((72.75, 25.25)):
            Rectangle(F5_W, F5_H)
        with Locations((71.25, 25.25)):
            Rectangle(F5_W, F5_H)
    extrude(amount=F6_DEPTH, both=True)

    # F7#2 (radius 1.5 in the source; OpenCascade refuses exactly that, so slightly less here)
    f7_2_edges = [f6b.edges().sort_by_distance(p)[0] for p in [
        (73.5, 1.5, 25.25),
        (70.5, 1.5, 25.25),
        (70.5, -1.5, 25.25),
    ]]
    fillet(f7_2_edges, radius=F7_2_R)


with BuildPart() as f9:
    # F8 (on Front) → F9 (new body)
    with BuildSketch(Plane.XZ):
        with Locations((71.625, 70)):
            Rectangle(F8_W, F8_H)
        with Locations((72.375, 70)):
            Rectangle(F8_W, F8_H)
    extrude(amount=-F9_DEPTH)


with BuildPart() as f11:
    # F10 (on Front) → F11 (new body, symmetric)
    with BuildSketch(Plane.XZ):
        with Locations((40.5, 70)):
            Rectangle(F10_W, F10_H)
    extrude(amount=F11_DEPTH, both=True)


solid = Compound([f1_4.part, f6.part, f6b.part, f9.part, f11.part])
